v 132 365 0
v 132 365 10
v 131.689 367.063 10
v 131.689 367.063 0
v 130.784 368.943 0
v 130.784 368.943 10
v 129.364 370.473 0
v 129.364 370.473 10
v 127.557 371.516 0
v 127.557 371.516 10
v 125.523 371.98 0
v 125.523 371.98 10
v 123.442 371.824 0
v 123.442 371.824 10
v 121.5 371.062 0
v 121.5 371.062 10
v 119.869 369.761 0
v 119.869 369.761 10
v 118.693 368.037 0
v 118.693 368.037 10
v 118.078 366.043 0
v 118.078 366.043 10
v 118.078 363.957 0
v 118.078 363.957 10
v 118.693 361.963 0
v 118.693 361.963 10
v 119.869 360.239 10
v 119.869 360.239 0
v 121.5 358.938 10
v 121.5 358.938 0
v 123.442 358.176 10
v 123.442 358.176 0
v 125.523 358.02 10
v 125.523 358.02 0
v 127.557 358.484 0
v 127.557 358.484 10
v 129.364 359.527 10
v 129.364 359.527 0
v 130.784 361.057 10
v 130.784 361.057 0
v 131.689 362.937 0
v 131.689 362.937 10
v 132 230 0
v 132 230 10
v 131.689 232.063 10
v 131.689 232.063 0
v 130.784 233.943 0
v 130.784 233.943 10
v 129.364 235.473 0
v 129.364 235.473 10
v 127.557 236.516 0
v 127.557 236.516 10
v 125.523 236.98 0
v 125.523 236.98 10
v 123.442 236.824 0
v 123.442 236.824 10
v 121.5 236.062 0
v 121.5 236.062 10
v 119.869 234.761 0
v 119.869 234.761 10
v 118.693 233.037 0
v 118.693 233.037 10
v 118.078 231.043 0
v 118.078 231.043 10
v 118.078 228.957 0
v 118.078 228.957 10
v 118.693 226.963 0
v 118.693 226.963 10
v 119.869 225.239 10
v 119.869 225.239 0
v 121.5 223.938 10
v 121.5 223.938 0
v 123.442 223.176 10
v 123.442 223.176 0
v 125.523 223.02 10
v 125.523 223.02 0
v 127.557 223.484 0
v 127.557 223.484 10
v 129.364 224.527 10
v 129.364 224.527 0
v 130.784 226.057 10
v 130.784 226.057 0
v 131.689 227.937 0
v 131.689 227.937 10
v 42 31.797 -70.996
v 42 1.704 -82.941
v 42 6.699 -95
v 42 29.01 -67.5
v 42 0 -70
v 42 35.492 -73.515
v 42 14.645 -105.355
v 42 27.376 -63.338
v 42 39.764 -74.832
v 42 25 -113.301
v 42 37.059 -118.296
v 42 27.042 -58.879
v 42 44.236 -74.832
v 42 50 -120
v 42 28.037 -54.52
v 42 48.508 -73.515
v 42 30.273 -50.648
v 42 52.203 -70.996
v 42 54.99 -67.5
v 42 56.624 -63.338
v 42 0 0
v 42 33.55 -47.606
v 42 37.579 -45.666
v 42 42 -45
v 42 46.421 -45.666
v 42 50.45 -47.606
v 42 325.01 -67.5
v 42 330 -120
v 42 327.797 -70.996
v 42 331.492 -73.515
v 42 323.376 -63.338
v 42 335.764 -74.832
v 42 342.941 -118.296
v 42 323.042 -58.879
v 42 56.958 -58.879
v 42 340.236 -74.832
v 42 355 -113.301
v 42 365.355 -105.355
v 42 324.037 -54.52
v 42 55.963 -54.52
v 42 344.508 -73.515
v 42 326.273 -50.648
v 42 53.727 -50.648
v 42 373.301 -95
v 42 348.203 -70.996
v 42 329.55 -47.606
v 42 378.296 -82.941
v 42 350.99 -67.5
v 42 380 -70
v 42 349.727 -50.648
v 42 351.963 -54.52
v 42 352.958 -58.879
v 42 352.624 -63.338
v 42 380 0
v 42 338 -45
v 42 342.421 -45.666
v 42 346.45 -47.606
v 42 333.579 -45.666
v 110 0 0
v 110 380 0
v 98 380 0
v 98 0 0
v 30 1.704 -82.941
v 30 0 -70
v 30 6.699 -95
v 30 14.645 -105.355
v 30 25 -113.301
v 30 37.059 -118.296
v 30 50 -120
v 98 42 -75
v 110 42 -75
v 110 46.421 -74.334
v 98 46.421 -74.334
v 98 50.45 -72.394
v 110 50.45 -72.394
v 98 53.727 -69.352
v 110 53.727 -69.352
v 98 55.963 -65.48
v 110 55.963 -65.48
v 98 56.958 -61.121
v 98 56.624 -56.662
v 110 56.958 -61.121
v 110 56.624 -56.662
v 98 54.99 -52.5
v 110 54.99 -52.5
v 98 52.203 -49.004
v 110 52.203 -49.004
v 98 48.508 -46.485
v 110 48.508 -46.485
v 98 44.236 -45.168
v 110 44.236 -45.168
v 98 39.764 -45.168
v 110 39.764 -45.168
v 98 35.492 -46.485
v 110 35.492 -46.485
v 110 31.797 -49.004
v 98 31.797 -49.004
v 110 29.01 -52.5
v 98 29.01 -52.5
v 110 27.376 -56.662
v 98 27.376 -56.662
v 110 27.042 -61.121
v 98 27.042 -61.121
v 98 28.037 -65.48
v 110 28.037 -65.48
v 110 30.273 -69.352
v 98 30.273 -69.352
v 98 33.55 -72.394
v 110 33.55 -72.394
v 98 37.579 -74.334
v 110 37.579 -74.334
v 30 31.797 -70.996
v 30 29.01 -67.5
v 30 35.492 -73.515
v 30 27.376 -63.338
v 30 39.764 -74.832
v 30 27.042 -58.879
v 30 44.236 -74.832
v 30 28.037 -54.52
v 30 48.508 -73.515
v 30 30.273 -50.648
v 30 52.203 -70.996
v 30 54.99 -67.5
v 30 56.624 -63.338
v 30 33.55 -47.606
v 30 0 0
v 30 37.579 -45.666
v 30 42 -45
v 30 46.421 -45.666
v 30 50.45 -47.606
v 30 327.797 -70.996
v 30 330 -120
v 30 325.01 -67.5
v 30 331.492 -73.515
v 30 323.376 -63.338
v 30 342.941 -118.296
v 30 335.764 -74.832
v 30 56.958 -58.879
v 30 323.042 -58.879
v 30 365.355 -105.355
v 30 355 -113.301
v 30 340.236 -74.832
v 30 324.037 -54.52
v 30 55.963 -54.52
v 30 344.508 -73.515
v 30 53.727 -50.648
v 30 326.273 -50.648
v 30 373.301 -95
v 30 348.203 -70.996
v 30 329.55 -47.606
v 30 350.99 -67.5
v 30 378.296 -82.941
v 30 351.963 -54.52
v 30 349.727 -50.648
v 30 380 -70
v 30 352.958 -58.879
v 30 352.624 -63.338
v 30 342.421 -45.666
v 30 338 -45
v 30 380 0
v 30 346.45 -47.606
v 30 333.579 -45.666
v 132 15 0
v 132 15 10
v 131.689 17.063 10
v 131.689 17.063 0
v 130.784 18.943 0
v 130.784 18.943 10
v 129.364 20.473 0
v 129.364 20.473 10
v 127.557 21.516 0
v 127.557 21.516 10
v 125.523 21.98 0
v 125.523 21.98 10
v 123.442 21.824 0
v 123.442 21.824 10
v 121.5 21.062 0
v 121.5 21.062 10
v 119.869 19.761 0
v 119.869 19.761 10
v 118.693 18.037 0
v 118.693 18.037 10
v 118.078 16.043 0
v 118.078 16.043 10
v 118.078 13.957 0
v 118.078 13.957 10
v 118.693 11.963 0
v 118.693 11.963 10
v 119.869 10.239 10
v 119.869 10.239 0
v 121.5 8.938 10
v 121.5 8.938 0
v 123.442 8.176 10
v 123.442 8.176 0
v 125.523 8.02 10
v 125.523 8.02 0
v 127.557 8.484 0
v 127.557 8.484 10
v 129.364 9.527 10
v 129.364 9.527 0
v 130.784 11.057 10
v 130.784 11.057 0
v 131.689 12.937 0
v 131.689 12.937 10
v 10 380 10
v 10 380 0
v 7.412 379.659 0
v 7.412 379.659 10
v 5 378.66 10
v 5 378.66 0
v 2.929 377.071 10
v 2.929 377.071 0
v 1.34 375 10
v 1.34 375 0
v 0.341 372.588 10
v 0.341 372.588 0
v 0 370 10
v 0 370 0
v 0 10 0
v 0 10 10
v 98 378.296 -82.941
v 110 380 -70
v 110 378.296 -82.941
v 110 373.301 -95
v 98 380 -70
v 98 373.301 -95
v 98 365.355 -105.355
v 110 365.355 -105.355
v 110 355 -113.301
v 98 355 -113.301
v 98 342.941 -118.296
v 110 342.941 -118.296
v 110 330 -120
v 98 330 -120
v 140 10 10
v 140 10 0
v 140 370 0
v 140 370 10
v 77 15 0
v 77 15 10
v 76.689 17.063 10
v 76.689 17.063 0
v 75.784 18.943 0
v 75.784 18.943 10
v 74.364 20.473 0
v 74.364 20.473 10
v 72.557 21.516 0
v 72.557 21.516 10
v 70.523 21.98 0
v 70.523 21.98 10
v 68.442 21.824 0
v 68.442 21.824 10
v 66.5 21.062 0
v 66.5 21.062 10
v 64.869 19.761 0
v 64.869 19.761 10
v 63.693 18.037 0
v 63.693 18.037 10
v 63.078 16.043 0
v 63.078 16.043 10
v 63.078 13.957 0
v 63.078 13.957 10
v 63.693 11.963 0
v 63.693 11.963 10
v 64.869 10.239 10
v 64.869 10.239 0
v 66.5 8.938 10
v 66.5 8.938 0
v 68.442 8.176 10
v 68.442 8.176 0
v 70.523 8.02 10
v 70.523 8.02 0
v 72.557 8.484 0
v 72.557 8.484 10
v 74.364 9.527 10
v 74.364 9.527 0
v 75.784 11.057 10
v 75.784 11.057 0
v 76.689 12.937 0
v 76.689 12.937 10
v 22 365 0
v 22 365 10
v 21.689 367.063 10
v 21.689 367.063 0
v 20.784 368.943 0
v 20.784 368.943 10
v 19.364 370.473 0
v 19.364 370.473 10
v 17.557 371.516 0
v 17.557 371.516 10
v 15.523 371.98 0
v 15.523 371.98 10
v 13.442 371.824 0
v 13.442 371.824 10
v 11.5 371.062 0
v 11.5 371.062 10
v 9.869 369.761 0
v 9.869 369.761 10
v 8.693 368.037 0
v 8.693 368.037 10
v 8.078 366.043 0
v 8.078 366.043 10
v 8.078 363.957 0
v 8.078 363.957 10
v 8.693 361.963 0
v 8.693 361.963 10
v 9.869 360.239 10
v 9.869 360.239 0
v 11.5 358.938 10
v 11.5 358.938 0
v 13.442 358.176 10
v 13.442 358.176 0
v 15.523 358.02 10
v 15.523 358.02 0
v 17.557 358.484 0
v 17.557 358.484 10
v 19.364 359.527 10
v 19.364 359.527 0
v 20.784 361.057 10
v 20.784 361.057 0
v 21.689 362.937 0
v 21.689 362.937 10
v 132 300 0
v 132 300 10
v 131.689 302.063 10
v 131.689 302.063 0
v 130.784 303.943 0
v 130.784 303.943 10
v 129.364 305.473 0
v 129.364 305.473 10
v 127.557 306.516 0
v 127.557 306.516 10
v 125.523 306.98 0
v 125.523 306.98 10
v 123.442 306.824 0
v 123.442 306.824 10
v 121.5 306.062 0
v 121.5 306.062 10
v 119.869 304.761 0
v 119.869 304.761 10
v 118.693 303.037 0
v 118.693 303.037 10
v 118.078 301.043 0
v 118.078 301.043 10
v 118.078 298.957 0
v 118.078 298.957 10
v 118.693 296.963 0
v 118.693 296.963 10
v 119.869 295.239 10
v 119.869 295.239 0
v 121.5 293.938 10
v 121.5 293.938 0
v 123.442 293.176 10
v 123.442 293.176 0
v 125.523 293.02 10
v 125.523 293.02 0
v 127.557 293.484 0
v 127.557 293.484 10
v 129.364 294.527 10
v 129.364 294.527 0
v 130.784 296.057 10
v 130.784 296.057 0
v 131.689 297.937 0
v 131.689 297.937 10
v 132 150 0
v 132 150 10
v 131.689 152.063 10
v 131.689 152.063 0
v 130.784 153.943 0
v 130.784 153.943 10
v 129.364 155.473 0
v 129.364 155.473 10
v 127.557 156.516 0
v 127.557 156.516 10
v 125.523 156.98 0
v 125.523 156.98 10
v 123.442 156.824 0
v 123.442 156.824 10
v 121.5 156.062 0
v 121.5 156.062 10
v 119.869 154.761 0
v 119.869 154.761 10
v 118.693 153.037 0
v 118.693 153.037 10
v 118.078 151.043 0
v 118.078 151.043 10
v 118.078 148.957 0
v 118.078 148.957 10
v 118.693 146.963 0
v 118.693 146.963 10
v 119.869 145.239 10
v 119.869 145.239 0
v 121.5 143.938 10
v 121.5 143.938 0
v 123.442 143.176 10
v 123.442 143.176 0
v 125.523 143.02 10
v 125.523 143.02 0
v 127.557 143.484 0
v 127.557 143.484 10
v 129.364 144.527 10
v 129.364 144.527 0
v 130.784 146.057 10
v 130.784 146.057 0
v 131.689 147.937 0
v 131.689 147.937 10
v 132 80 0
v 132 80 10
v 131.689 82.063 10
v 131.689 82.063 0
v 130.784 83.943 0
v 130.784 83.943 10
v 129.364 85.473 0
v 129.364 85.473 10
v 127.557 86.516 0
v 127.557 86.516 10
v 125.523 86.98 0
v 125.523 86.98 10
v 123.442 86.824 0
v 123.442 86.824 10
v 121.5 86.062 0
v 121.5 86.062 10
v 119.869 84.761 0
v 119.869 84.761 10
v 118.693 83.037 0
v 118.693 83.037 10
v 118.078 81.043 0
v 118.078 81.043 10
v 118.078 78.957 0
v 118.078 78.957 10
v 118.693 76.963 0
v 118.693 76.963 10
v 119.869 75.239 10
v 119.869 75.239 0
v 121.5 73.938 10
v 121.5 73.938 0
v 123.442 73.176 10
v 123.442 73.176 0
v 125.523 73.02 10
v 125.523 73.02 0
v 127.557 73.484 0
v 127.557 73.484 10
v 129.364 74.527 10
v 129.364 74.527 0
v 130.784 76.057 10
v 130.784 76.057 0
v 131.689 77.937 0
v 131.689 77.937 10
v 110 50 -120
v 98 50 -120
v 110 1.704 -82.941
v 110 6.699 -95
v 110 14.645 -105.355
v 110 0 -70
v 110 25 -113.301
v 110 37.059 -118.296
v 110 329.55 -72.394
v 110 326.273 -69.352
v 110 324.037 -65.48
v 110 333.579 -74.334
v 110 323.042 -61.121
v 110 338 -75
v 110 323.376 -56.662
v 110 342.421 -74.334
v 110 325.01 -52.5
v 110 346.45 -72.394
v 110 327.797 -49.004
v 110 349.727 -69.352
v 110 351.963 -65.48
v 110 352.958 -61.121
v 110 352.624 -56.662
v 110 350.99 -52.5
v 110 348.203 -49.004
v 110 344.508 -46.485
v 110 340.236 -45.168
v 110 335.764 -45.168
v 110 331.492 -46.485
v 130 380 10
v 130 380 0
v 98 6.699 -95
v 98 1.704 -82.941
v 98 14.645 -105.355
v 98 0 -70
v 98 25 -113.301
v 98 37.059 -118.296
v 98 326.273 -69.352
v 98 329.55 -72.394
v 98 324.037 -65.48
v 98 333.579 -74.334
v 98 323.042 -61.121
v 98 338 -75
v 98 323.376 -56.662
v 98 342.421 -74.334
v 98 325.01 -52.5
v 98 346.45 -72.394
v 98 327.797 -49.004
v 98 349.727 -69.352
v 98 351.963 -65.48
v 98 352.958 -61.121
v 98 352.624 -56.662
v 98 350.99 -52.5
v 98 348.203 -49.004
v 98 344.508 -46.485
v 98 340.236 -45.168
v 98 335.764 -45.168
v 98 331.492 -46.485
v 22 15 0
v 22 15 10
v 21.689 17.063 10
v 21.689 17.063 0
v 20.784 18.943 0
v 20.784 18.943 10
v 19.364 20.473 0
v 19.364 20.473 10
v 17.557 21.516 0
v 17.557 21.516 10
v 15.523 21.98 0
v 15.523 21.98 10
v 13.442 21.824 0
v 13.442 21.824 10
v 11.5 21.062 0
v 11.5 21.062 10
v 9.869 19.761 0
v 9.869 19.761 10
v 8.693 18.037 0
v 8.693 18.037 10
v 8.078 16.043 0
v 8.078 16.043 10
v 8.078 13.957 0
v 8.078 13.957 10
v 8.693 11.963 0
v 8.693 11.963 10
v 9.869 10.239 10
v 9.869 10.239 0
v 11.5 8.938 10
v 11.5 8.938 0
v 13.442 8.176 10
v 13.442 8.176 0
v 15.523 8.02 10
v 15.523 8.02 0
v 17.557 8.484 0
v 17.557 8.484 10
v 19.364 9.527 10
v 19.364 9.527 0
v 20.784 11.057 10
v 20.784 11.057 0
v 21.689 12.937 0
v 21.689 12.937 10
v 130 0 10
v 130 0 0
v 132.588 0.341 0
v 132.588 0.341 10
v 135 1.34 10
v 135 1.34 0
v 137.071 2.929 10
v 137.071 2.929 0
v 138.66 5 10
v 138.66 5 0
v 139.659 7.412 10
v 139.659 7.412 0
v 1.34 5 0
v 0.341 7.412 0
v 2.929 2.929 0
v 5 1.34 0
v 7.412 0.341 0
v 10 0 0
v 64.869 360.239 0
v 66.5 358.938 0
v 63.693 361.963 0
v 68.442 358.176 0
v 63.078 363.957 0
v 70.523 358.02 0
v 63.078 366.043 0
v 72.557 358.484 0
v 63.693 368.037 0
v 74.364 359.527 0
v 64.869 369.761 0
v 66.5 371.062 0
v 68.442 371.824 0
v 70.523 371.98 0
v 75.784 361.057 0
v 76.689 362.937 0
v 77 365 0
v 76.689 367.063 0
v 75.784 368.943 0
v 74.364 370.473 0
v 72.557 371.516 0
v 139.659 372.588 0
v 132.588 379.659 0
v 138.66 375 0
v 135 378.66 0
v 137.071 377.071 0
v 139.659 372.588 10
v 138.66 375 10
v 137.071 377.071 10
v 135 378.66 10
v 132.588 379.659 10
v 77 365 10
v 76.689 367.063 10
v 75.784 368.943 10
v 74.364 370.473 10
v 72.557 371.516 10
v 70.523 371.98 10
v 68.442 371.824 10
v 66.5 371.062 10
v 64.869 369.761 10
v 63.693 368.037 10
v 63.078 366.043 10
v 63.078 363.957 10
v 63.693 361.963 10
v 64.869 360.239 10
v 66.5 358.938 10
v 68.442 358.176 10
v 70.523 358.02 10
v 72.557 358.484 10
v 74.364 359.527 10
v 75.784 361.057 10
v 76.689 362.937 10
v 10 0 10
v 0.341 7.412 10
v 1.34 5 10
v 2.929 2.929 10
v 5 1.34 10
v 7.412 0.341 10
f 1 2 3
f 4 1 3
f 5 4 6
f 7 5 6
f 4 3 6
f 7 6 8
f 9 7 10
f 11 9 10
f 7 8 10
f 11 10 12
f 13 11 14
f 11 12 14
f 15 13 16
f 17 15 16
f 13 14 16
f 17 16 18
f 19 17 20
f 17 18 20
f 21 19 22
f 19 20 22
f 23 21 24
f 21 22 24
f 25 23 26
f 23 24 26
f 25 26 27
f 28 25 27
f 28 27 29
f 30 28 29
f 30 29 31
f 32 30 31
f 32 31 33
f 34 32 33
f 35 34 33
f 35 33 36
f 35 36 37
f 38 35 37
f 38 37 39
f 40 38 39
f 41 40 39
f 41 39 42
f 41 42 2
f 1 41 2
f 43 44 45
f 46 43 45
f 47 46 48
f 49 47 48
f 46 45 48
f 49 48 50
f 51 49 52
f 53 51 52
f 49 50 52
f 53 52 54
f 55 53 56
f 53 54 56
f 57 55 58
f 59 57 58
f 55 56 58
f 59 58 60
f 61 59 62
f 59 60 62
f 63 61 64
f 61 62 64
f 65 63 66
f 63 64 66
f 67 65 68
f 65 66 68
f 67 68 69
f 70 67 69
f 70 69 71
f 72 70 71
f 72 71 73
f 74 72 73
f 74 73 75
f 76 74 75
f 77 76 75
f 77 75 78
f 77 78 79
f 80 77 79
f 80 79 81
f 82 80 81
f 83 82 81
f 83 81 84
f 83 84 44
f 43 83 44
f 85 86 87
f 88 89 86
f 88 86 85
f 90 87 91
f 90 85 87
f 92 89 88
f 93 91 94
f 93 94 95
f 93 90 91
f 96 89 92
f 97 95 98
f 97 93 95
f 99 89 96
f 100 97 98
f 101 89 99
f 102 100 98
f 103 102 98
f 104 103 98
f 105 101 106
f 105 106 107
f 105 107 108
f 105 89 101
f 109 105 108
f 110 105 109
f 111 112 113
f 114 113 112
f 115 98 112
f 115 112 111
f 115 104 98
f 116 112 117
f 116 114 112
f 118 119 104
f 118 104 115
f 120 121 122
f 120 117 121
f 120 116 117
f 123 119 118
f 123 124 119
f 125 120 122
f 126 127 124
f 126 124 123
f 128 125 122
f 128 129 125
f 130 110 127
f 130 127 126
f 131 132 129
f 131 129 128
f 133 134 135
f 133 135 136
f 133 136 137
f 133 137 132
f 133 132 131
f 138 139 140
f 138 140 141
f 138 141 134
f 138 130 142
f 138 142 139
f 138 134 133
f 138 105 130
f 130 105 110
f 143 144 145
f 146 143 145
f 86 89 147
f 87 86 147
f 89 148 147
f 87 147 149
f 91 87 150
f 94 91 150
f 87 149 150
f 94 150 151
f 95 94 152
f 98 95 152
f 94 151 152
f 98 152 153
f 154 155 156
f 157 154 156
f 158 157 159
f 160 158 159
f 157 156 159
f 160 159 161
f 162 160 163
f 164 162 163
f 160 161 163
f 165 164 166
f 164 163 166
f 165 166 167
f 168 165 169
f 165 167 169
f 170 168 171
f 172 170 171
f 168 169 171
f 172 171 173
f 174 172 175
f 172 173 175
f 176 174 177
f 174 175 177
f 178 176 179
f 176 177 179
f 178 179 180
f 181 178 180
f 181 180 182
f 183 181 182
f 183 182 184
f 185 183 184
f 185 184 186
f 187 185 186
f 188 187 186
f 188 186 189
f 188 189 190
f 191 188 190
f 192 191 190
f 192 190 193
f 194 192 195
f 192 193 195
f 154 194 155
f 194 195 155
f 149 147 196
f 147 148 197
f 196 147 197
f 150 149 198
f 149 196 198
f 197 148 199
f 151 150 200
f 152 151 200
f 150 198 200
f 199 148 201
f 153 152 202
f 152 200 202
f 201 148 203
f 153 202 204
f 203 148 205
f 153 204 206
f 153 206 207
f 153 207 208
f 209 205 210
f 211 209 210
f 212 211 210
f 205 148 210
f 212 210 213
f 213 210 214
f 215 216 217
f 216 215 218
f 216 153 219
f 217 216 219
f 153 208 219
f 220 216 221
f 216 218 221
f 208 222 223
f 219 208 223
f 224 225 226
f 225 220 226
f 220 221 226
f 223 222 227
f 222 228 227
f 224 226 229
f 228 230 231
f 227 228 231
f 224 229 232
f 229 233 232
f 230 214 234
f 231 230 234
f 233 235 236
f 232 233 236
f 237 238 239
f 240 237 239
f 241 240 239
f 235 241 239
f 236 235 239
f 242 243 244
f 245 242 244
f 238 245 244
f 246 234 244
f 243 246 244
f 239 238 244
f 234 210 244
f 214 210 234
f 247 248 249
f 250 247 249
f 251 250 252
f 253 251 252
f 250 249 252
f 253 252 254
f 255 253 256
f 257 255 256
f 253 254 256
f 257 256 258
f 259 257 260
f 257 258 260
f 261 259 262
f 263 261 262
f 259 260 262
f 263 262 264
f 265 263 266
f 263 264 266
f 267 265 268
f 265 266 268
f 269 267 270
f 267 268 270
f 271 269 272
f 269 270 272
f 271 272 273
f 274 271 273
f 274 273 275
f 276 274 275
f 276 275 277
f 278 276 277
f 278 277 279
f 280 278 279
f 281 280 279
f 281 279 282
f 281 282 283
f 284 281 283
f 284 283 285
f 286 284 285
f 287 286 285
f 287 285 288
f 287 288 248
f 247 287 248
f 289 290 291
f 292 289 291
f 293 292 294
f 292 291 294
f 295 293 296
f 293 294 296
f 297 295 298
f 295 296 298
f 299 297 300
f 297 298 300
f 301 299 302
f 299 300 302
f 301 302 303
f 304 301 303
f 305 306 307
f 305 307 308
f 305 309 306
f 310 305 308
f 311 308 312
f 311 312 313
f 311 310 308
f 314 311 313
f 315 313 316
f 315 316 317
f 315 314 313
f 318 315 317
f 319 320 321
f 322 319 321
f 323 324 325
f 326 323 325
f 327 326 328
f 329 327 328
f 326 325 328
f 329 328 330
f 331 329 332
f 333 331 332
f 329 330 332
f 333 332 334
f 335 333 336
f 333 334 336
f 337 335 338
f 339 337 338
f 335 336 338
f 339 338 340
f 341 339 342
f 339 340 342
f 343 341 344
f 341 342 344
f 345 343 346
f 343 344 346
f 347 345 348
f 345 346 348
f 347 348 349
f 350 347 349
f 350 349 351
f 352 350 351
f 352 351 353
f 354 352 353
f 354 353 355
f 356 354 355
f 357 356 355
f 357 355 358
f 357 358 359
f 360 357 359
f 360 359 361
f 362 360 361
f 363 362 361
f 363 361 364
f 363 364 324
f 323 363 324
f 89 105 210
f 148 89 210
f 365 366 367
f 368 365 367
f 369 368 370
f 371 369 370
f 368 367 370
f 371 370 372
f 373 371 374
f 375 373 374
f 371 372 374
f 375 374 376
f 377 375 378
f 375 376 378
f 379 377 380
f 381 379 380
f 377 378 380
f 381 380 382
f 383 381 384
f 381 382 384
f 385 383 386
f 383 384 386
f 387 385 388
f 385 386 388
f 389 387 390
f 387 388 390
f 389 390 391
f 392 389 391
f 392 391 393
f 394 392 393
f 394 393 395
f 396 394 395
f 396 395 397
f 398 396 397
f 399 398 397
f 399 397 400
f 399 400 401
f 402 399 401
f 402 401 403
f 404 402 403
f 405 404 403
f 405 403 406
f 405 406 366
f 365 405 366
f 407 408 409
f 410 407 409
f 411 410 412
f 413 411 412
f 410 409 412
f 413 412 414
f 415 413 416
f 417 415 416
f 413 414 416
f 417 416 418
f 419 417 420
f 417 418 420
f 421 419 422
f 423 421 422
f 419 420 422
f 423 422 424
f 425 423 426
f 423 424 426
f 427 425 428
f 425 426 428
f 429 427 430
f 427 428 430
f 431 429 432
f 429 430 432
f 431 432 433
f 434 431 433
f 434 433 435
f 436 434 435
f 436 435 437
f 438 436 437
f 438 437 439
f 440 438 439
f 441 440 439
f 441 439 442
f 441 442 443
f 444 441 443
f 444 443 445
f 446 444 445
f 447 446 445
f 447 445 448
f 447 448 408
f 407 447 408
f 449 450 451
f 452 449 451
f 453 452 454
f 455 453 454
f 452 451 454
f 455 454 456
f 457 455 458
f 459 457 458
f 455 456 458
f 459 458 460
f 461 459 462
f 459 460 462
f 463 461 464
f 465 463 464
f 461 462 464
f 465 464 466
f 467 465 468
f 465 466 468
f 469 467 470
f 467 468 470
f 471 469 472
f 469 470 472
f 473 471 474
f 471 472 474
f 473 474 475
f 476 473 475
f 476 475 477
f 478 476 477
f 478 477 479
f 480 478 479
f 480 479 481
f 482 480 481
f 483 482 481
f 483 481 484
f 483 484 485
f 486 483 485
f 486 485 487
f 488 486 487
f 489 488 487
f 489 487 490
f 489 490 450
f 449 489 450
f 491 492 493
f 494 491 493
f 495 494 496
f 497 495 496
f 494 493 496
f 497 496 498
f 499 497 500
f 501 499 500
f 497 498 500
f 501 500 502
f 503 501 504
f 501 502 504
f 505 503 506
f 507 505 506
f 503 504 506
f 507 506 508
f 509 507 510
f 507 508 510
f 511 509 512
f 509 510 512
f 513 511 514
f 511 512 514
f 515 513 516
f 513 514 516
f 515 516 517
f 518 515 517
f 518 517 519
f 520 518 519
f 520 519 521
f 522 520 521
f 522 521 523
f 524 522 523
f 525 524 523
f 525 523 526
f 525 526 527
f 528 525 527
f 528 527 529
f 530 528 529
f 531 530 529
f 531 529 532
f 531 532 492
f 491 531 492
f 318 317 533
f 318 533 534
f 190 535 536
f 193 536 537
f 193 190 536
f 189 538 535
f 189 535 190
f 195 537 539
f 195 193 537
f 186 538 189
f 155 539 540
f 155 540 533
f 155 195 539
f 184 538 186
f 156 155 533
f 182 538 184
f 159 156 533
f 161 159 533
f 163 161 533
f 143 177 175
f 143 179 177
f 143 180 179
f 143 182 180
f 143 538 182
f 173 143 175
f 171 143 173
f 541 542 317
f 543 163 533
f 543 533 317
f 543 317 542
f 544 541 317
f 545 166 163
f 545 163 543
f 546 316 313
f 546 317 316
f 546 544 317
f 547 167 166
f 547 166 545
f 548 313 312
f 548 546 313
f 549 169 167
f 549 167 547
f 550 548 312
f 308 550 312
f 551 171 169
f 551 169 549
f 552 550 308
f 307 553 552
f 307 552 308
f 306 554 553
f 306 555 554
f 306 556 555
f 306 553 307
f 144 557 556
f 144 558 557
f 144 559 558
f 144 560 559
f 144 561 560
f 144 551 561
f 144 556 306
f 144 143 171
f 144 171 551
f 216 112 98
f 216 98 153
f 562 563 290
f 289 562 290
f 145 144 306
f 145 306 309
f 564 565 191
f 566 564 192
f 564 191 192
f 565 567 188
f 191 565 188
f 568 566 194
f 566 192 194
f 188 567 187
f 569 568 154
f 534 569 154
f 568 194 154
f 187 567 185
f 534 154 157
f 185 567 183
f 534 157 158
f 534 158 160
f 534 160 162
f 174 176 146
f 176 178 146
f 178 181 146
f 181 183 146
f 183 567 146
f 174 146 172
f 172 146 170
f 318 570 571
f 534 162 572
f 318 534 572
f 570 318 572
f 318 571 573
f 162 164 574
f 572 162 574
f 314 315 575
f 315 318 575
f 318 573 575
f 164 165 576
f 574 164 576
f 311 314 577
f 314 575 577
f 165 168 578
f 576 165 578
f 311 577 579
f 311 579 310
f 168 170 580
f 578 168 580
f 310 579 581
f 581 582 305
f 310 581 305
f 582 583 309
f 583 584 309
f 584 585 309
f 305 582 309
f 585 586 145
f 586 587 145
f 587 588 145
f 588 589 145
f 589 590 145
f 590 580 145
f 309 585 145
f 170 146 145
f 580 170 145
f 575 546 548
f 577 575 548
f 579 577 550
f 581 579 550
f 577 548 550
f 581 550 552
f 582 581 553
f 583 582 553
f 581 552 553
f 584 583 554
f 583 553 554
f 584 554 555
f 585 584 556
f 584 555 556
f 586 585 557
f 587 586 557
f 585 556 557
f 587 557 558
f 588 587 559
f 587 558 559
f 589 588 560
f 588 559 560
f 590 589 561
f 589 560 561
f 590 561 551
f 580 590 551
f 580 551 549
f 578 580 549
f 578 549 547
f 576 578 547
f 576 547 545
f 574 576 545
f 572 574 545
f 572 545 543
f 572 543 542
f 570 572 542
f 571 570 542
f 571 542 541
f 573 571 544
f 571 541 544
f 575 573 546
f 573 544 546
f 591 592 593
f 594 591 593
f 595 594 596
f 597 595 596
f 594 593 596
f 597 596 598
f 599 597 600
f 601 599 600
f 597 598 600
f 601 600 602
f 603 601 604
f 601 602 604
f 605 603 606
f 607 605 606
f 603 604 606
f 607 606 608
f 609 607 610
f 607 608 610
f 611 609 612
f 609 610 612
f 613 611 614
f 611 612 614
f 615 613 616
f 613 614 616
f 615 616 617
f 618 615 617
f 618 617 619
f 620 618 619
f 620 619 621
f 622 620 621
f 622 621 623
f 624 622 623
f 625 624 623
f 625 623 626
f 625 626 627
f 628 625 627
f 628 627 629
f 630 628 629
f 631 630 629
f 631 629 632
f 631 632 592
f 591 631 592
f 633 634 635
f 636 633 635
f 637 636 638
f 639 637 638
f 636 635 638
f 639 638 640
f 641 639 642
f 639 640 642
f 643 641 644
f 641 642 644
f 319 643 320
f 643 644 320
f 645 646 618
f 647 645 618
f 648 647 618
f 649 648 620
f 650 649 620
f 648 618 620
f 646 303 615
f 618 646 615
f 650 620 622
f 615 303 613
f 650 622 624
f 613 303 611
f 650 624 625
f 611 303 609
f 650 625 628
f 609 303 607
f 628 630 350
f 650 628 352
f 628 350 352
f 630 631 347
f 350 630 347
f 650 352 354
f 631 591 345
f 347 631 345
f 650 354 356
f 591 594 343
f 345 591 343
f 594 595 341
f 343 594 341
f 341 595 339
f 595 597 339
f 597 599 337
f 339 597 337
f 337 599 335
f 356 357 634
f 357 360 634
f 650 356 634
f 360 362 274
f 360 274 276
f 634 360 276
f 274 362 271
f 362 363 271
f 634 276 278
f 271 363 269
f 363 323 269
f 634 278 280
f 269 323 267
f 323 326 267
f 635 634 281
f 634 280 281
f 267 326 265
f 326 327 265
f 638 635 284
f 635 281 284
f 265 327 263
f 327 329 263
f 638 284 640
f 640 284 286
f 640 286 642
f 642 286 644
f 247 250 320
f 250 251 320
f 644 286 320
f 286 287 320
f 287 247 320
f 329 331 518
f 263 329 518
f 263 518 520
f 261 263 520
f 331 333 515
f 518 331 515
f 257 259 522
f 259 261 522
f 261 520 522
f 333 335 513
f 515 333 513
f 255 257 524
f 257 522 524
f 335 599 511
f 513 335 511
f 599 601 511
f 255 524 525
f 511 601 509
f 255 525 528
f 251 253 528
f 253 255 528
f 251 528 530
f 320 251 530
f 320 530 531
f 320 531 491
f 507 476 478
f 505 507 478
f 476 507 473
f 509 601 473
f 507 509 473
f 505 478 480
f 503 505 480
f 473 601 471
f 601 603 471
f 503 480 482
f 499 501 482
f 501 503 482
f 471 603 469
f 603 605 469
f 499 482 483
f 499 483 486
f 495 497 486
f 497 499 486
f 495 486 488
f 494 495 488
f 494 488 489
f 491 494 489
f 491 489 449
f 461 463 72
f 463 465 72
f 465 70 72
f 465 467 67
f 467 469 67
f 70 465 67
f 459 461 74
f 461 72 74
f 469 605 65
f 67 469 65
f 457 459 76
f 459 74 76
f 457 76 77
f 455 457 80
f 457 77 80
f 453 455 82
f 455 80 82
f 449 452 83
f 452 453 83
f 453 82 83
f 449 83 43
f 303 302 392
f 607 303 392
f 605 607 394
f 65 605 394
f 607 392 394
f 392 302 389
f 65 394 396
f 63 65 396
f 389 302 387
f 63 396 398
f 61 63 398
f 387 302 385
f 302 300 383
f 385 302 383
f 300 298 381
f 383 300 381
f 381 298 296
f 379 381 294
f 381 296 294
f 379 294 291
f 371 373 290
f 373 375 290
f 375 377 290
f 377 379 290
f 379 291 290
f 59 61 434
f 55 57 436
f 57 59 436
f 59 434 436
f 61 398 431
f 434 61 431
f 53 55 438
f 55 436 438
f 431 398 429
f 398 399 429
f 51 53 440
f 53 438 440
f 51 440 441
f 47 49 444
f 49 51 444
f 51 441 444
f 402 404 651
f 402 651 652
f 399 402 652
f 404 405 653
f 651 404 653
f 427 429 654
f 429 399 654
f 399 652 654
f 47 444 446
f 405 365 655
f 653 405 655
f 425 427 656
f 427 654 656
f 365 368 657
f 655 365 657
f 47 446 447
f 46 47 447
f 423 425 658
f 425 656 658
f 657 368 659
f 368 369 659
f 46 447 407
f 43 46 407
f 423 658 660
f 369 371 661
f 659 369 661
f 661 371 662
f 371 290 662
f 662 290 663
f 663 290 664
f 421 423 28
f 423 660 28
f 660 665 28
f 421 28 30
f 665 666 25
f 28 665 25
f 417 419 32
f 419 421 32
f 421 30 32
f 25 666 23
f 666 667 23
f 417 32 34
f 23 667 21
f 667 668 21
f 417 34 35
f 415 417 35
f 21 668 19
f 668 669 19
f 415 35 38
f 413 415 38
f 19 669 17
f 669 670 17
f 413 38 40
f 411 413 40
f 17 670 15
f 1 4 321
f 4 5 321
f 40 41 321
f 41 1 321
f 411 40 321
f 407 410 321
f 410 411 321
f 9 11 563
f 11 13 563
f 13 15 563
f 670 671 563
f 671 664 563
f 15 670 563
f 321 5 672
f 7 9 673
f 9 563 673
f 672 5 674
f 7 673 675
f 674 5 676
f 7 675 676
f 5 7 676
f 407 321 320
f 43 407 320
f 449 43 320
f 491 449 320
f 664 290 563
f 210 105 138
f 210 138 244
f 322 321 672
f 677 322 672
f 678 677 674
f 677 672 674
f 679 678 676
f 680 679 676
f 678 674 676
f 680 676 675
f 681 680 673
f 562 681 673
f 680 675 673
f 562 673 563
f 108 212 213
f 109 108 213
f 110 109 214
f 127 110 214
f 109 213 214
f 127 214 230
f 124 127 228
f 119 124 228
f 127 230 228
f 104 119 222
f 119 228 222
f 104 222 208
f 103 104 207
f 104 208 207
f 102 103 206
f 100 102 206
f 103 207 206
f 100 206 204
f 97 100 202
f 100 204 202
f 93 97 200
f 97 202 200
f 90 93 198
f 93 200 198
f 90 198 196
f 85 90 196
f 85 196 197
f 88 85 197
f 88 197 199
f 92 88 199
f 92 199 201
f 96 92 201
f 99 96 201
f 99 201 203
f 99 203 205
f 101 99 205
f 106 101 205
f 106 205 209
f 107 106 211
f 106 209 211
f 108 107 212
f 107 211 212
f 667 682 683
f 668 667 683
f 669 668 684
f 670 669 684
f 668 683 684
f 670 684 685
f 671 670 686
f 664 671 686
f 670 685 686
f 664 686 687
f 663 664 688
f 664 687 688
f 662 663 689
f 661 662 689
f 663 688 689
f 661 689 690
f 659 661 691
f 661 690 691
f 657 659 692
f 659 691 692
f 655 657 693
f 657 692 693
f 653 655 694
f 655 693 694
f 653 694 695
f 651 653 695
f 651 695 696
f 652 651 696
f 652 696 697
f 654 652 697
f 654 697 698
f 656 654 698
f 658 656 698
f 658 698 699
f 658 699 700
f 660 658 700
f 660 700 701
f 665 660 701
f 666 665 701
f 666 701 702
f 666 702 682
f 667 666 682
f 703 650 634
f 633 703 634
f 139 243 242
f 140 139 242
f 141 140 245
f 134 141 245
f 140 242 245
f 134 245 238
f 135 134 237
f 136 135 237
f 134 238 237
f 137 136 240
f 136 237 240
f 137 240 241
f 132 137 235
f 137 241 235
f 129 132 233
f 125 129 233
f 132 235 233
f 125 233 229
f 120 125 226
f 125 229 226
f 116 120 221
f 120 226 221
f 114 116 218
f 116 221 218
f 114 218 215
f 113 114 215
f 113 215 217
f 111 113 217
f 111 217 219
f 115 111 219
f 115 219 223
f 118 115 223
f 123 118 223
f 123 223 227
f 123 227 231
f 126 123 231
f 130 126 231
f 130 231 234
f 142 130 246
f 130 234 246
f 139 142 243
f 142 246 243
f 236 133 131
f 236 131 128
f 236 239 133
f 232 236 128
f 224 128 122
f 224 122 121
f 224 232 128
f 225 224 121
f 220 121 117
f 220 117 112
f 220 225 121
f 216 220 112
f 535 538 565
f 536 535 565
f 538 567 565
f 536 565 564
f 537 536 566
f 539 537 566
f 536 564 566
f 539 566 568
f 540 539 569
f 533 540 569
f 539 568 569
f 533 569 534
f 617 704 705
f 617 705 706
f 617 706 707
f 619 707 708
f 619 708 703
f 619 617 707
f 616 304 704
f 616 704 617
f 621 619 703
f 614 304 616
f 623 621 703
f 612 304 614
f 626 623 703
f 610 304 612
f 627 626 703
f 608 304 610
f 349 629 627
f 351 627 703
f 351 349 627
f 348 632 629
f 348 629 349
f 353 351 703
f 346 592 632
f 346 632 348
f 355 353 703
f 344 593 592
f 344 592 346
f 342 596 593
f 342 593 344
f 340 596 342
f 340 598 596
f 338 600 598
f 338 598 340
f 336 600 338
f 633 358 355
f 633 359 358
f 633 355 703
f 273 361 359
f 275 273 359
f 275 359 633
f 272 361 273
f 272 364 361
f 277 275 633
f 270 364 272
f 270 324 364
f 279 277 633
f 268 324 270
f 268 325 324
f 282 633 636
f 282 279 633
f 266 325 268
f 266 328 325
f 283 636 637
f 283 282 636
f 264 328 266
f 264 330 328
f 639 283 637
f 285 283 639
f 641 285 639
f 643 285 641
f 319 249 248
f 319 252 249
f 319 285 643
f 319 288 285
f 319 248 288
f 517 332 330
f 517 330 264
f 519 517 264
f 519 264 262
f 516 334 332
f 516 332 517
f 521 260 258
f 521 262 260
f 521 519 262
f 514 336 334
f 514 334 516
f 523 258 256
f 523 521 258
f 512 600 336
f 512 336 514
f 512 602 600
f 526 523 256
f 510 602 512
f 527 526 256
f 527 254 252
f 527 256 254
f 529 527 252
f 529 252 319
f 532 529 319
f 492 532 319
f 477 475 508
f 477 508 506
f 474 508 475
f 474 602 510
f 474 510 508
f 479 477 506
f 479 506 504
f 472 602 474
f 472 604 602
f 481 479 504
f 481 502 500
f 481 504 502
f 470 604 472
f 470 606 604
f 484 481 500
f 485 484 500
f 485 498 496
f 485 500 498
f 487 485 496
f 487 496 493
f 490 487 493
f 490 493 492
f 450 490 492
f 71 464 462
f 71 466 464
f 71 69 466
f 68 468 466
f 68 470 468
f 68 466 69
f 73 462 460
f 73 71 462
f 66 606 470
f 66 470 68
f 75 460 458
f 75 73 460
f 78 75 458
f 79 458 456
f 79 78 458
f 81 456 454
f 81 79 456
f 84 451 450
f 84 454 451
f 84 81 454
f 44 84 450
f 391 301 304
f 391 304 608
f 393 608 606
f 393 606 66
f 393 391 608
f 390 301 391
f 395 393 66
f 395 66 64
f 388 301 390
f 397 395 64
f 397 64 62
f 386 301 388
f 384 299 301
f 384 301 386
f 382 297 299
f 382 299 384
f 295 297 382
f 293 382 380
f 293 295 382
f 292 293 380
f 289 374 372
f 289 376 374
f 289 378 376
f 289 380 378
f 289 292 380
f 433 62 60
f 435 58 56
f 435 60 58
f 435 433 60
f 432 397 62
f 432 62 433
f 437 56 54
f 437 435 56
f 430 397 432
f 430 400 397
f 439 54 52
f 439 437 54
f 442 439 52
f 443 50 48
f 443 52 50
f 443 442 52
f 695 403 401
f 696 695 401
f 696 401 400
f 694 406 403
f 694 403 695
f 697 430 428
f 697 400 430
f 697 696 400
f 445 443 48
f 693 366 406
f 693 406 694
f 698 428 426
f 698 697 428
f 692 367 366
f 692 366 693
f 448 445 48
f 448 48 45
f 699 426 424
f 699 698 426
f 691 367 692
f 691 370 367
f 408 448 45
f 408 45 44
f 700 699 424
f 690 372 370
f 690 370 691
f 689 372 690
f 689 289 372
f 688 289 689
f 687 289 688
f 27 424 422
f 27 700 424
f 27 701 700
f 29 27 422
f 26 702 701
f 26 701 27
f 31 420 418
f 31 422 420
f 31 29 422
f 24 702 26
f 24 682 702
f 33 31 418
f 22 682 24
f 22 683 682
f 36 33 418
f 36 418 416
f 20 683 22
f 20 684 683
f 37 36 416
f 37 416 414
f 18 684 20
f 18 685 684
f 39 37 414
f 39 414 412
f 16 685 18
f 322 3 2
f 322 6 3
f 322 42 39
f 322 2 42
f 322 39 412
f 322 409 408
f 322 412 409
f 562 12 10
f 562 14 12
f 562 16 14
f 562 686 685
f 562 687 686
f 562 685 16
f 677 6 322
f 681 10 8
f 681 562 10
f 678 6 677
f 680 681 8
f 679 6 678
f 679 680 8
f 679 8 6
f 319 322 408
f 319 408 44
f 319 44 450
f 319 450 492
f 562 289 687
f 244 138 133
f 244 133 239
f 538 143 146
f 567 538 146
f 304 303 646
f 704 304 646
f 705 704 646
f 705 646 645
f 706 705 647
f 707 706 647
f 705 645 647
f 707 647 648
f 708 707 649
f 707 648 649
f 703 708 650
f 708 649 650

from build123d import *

# Parameters (mm, degrees)
EXTRUDE_1_DEPTH     = 10
CUT_EXTRUDE_1_REACH = 12
SKETCH_2_R          = 7
SKETCH_3_W          = 12
SKETCH_3_H          = 380
EXTRUDE_2_DEPTH     = 120
EXTRUDE_2_2_DEPTH   = 120
FILLET_1_R          = 50
FILLET_2_R          = 50
SKETCH_4_R          = 15
CUT_EXTRUDE_2_DEPTH = 12
SKETCH_5_R          = 15
CUT_EXTRUDE_3_DEPTH = 12


with BuildPart() as part:
    # 草图1 → 凸台-拉伸1 (new body)
    with BuildSketch(Plane.XY):
        with BuildLine():
            Line((10, 0), (130, 0))
            ThreePointArc((130, 0), (137.071067812, 2.928932188), (140, 10))
            Line((140, 10), (140, 370))
            ThreePointArc((140, 370), (137.071067812, 377.071067812), (130, 380))
            Line((130, 380), (10, 380))
            ThreePointArc((10, 380), (2.928932188, 377.071067812), (0, 370))
            Line((0, 370), (0, 10))
            ThreePointArc((0, 10), (2.928932188, 2.928932188), (10, 0))
        make_face()
    extrude(amount=EXTRUDE_1_DEPTH)

    # 草图2 → 切除-拉伸1 (cut, up to next)
    with BuildSketch(Plane.XY.offset(10), mode=Mode.PRIVATE) as cut_extrude_1_sk1:
        with Locations((15, 365)):
            Circle(SKETCH_2_R)
    cut_extrude_1_tool1 = extrude(cut_extrude_1_sk1.sketch, amount=-CUT_EXTRUDE_1_REACH, mode=Mode.PRIVATE) & part.part
    add(cut_extrude_1_tool1.solids().sort_by_distance((15, 365, 10))[0], mode=Mode.SUBTRACT)
    # 草图2 → 切除-拉伸1 (cut, up to next)
    with BuildSketch(Plane.XY.offset(10), mode=Mode.PRIVATE) as cut_extrude_1_sk2:
        with Locations((125, 365)):
            Circle(SKETCH_2_R)
    cut_extrude_1_tool2 = extrude(cut_extrude_1_sk2.sketch, amount=-CUT_EXTRUDE_1_REACH, mode=Mode.PRIVATE) & part.part
    add(cut_extrude_1_tool2.solids().sort_by_distance((125, 365, 10))[0], mode=Mode.SUBTRACT)
    # 草图2 → 切除-拉伸1 (cut, up to next)
    with BuildSketch(Plane.XY.offset(10), mode=Mode.PRIVATE) as cut_extrude_1_sk3:
        with Locations((15, 15)):
            Circle(SKETCH_2_R)
    cut_extrude_1_tool3 = extrude(cut_extrude_1_sk3.sketch, amount=-CUT_EXTRUDE_1_REACH, mode=Mode.PRIVATE) & part.part
    add(cut_extrude_1_tool3.solids().sort_by_distance((15, 15, 10))[0], mode=Mode.SUBTRACT)
    # 草图2 → 切除-拉伸1 (cut, up to next)
    with BuildSketch(Plane.XY.offset(10), mode=Mode.PRIVATE) as cut_extrude_1_sk4:
        with Locations((125, 15)):
            Circle(SKETCH_2_R)
    cut_extrude_1_tool4 = extrude(cut_extrude_1_sk4.sketch, amount=-CUT_EXTRUDE_1_REACH, mode=Mode.PRIVATE) & part.part
    add(cut_extrude_1_tool4.solids().sort_by_distance((125, 15, 10))[0], mode=Mode.SUBTRACT)
    # 草图2 → 切除-拉伸1 (cut, up to next)
    with BuildSketch(Plane.XY.offset(10), mode=Mode.PRIVATE) as cut_extrude_1_sk5:
        with Locations((70, 365)):
            Circle(SKETCH_2_R)
    cut_extrude_1_tool5 = extrude(cut_extrude_1_sk5.sketch, amount=-CUT_EXTRUDE_1_REACH, mode=Mode.PRIVATE) & part.part
    add(cut_extrude_1_tool5.solids().sort_by_distance((70, 365, 10))[0], mode=Mode.SUBTRACT)
    # 草图2 → 切除-拉伸1 (cut, up to next)
    with BuildSketch(Plane.XY.offset(10), mode=Mode.PRIVATE) as cut_extrude_1_sk6:
        with Locations((70, 15)):
            Circle(SKETCH_2_R)
    cut_extrude_1_tool6 = extrude(cut_extrude_1_sk6.sketch, amount=-CUT_EXTRUDE_1_REACH, mode=Mode.PRIVATE) & part.part
    add(cut_extrude_1_tool6.solids().sort_by_distance((70, 15, 10))[0], mode=Mode.SUBTRACT)
    # 草图2 → 切除-拉伸1 (cut, up to next)
    with BuildSketch(Plane.XY.offset(10), mode=Mode.PRIVATE) as cut_extrude_1_sk7:
        with Locations((125, 300)):
            Circle(SKETCH_2_R)
    cut_extrude_1_tool7 = extrude(cut_extrude_1_sk7.sketch, amount=-CUT_EXTRUDE_1_REACH, mode=Mode.PRIVATE) & part.part
    add(cut_extrude_1_tool7.solids().sort_by_distance((125, 300, 10))[0], mode=Mode.SUBTRACT)
    # 草图2 → 切除-拉伸1 (cut, up to next)
    with BuildSketch(Plane.XY.offset(10), mode=Mode.PRIVATE) as cut_extrude_1_sk8:
        with Locations((125, 80)):
            Circle(SKETCH_2_R)
    cut_extrude_1_tool8 = extrude(cut_extrude_1_sk8.sketch, amount=-CUT_EXTRUDE_1_REACH, mode=Mode.PRIVATE) & part.part
    add(cut_extrude_1_tool8.solids().sort_by_distance((125, 80, 10))[0], mode=Mode.SUBTRACT)
    # 草图2 → 切除-拉伸1 (cut, up to next)
    with BuildSketch(Plane.XY.offset(10), mode=Mode.PRIVATE) as cut_extrude_1_sk9:
        with Locations((125, 230)):
            Circle(SKETCH_2_R)
    cut_extrude_1_tool9 = extrude(cut_extrude_1_sk9.sketch, amount=-CUT_EXTRUDE_1_REACH, mode=Mode.PRIVATE) & part.part
    add(cut_extrude_1_tool9.solids().sort_by_distance((125, 230, 10))[0], mode=Mode.SUBTRACT)
    # 草图2 → 切除-拉伸1 (cut, up to next)
    with BuildSketch(Plane.XY.offset(10), mode=Mode.PRIVATE) as cut_extrude_1_sk10:
        with Locations((125, 150)):
            Circle(SKETCH_2_R)
    cut_extrude_1_tool10 = extrude(cut_extrude_1_sk10.sketch, amount=-CUT_EXTRUDE_1_REACH, mode=Mode.PRIVATE) & part.part
    add(cut_extrude_1_tool10.solids().sort_by_distance((125, 150, 10))[0], mode=Mode.SUBTRACT)


with BuildPart() as body_2:
    # 草图3 → 凸台-拉伸2 (new body)
    with BuildSketch(Plane(origin=(0, 0, 0), x_dir=(-1, 0, 0), z_dir=(0, 0, -1))):
        with Locations((-104, 190)):
            Rectangle(SKETCH_3_W, SKETCH_3_H)
    extrude(amount=EXTRUDE_2_DEPTH)

    # 圆角1
    fillet_1_edges = [body_2.edges().sort_by_distance(p)[0] for p in [
        (104, 380, -120),
        (104, 0, -120),
    ]]
    fillet(fillet_1_edges, radius=FILLET_1_R)

    # 草图4 → 切除-拉伸2 (cut)
    with BuildSketch(Plane(origin=(110, 0, 0), x_dir=(0, 0, -1), z_dir=(1, 0, 0))):
        with Locations((60, 338)):
            Circle(SKETCH_4_R)
        with Locations((60, 42)):
            Circle(SKETCH_4_R)
    extrude(amount=-CUT_EXTRUDE_2_DEPTH, mode=Mode.SUBTRACT)


with BuildPart() as body_3:
    # 草图3 → Extrude 2 2 (new body)
    with BuildSketch(Plane(origin=(0, 0, 0), x_dir=(-1, 0, 0), z_dir=(0, 0, -1))):
        with Locations((-36, 190)):
            Rectangle(SKETCH_3_W, SKETCH_3_H)
    extrude(amount=EXTRUDE_2_2_DEPTH)

    # 圆角2
    fillet_2_edges = [body_3.edges().sort_by_distance(p)[0] for p in [
        (36, 380, -120),
        (36, 0, -120),
    ]]
    fillet(fillet_2_edges, radius=FILLET_2_R)

    # 草图5 → 切除-拉伸3 (cut)
    with BuildSketch(Plane.ZY.offset(-30)):
        with Locations((-60, 338)):
            Circle(SKETCH_5_R)
        with Locations((-60, 42)):
            Circle(SKETCH_5_R)
    extrude(amount=-CUT_EXTRUDE_3_DEPTH, mode=Mode.SUBTRACT)


solid = Compound([part.part, body_2.part, body_3.part])
